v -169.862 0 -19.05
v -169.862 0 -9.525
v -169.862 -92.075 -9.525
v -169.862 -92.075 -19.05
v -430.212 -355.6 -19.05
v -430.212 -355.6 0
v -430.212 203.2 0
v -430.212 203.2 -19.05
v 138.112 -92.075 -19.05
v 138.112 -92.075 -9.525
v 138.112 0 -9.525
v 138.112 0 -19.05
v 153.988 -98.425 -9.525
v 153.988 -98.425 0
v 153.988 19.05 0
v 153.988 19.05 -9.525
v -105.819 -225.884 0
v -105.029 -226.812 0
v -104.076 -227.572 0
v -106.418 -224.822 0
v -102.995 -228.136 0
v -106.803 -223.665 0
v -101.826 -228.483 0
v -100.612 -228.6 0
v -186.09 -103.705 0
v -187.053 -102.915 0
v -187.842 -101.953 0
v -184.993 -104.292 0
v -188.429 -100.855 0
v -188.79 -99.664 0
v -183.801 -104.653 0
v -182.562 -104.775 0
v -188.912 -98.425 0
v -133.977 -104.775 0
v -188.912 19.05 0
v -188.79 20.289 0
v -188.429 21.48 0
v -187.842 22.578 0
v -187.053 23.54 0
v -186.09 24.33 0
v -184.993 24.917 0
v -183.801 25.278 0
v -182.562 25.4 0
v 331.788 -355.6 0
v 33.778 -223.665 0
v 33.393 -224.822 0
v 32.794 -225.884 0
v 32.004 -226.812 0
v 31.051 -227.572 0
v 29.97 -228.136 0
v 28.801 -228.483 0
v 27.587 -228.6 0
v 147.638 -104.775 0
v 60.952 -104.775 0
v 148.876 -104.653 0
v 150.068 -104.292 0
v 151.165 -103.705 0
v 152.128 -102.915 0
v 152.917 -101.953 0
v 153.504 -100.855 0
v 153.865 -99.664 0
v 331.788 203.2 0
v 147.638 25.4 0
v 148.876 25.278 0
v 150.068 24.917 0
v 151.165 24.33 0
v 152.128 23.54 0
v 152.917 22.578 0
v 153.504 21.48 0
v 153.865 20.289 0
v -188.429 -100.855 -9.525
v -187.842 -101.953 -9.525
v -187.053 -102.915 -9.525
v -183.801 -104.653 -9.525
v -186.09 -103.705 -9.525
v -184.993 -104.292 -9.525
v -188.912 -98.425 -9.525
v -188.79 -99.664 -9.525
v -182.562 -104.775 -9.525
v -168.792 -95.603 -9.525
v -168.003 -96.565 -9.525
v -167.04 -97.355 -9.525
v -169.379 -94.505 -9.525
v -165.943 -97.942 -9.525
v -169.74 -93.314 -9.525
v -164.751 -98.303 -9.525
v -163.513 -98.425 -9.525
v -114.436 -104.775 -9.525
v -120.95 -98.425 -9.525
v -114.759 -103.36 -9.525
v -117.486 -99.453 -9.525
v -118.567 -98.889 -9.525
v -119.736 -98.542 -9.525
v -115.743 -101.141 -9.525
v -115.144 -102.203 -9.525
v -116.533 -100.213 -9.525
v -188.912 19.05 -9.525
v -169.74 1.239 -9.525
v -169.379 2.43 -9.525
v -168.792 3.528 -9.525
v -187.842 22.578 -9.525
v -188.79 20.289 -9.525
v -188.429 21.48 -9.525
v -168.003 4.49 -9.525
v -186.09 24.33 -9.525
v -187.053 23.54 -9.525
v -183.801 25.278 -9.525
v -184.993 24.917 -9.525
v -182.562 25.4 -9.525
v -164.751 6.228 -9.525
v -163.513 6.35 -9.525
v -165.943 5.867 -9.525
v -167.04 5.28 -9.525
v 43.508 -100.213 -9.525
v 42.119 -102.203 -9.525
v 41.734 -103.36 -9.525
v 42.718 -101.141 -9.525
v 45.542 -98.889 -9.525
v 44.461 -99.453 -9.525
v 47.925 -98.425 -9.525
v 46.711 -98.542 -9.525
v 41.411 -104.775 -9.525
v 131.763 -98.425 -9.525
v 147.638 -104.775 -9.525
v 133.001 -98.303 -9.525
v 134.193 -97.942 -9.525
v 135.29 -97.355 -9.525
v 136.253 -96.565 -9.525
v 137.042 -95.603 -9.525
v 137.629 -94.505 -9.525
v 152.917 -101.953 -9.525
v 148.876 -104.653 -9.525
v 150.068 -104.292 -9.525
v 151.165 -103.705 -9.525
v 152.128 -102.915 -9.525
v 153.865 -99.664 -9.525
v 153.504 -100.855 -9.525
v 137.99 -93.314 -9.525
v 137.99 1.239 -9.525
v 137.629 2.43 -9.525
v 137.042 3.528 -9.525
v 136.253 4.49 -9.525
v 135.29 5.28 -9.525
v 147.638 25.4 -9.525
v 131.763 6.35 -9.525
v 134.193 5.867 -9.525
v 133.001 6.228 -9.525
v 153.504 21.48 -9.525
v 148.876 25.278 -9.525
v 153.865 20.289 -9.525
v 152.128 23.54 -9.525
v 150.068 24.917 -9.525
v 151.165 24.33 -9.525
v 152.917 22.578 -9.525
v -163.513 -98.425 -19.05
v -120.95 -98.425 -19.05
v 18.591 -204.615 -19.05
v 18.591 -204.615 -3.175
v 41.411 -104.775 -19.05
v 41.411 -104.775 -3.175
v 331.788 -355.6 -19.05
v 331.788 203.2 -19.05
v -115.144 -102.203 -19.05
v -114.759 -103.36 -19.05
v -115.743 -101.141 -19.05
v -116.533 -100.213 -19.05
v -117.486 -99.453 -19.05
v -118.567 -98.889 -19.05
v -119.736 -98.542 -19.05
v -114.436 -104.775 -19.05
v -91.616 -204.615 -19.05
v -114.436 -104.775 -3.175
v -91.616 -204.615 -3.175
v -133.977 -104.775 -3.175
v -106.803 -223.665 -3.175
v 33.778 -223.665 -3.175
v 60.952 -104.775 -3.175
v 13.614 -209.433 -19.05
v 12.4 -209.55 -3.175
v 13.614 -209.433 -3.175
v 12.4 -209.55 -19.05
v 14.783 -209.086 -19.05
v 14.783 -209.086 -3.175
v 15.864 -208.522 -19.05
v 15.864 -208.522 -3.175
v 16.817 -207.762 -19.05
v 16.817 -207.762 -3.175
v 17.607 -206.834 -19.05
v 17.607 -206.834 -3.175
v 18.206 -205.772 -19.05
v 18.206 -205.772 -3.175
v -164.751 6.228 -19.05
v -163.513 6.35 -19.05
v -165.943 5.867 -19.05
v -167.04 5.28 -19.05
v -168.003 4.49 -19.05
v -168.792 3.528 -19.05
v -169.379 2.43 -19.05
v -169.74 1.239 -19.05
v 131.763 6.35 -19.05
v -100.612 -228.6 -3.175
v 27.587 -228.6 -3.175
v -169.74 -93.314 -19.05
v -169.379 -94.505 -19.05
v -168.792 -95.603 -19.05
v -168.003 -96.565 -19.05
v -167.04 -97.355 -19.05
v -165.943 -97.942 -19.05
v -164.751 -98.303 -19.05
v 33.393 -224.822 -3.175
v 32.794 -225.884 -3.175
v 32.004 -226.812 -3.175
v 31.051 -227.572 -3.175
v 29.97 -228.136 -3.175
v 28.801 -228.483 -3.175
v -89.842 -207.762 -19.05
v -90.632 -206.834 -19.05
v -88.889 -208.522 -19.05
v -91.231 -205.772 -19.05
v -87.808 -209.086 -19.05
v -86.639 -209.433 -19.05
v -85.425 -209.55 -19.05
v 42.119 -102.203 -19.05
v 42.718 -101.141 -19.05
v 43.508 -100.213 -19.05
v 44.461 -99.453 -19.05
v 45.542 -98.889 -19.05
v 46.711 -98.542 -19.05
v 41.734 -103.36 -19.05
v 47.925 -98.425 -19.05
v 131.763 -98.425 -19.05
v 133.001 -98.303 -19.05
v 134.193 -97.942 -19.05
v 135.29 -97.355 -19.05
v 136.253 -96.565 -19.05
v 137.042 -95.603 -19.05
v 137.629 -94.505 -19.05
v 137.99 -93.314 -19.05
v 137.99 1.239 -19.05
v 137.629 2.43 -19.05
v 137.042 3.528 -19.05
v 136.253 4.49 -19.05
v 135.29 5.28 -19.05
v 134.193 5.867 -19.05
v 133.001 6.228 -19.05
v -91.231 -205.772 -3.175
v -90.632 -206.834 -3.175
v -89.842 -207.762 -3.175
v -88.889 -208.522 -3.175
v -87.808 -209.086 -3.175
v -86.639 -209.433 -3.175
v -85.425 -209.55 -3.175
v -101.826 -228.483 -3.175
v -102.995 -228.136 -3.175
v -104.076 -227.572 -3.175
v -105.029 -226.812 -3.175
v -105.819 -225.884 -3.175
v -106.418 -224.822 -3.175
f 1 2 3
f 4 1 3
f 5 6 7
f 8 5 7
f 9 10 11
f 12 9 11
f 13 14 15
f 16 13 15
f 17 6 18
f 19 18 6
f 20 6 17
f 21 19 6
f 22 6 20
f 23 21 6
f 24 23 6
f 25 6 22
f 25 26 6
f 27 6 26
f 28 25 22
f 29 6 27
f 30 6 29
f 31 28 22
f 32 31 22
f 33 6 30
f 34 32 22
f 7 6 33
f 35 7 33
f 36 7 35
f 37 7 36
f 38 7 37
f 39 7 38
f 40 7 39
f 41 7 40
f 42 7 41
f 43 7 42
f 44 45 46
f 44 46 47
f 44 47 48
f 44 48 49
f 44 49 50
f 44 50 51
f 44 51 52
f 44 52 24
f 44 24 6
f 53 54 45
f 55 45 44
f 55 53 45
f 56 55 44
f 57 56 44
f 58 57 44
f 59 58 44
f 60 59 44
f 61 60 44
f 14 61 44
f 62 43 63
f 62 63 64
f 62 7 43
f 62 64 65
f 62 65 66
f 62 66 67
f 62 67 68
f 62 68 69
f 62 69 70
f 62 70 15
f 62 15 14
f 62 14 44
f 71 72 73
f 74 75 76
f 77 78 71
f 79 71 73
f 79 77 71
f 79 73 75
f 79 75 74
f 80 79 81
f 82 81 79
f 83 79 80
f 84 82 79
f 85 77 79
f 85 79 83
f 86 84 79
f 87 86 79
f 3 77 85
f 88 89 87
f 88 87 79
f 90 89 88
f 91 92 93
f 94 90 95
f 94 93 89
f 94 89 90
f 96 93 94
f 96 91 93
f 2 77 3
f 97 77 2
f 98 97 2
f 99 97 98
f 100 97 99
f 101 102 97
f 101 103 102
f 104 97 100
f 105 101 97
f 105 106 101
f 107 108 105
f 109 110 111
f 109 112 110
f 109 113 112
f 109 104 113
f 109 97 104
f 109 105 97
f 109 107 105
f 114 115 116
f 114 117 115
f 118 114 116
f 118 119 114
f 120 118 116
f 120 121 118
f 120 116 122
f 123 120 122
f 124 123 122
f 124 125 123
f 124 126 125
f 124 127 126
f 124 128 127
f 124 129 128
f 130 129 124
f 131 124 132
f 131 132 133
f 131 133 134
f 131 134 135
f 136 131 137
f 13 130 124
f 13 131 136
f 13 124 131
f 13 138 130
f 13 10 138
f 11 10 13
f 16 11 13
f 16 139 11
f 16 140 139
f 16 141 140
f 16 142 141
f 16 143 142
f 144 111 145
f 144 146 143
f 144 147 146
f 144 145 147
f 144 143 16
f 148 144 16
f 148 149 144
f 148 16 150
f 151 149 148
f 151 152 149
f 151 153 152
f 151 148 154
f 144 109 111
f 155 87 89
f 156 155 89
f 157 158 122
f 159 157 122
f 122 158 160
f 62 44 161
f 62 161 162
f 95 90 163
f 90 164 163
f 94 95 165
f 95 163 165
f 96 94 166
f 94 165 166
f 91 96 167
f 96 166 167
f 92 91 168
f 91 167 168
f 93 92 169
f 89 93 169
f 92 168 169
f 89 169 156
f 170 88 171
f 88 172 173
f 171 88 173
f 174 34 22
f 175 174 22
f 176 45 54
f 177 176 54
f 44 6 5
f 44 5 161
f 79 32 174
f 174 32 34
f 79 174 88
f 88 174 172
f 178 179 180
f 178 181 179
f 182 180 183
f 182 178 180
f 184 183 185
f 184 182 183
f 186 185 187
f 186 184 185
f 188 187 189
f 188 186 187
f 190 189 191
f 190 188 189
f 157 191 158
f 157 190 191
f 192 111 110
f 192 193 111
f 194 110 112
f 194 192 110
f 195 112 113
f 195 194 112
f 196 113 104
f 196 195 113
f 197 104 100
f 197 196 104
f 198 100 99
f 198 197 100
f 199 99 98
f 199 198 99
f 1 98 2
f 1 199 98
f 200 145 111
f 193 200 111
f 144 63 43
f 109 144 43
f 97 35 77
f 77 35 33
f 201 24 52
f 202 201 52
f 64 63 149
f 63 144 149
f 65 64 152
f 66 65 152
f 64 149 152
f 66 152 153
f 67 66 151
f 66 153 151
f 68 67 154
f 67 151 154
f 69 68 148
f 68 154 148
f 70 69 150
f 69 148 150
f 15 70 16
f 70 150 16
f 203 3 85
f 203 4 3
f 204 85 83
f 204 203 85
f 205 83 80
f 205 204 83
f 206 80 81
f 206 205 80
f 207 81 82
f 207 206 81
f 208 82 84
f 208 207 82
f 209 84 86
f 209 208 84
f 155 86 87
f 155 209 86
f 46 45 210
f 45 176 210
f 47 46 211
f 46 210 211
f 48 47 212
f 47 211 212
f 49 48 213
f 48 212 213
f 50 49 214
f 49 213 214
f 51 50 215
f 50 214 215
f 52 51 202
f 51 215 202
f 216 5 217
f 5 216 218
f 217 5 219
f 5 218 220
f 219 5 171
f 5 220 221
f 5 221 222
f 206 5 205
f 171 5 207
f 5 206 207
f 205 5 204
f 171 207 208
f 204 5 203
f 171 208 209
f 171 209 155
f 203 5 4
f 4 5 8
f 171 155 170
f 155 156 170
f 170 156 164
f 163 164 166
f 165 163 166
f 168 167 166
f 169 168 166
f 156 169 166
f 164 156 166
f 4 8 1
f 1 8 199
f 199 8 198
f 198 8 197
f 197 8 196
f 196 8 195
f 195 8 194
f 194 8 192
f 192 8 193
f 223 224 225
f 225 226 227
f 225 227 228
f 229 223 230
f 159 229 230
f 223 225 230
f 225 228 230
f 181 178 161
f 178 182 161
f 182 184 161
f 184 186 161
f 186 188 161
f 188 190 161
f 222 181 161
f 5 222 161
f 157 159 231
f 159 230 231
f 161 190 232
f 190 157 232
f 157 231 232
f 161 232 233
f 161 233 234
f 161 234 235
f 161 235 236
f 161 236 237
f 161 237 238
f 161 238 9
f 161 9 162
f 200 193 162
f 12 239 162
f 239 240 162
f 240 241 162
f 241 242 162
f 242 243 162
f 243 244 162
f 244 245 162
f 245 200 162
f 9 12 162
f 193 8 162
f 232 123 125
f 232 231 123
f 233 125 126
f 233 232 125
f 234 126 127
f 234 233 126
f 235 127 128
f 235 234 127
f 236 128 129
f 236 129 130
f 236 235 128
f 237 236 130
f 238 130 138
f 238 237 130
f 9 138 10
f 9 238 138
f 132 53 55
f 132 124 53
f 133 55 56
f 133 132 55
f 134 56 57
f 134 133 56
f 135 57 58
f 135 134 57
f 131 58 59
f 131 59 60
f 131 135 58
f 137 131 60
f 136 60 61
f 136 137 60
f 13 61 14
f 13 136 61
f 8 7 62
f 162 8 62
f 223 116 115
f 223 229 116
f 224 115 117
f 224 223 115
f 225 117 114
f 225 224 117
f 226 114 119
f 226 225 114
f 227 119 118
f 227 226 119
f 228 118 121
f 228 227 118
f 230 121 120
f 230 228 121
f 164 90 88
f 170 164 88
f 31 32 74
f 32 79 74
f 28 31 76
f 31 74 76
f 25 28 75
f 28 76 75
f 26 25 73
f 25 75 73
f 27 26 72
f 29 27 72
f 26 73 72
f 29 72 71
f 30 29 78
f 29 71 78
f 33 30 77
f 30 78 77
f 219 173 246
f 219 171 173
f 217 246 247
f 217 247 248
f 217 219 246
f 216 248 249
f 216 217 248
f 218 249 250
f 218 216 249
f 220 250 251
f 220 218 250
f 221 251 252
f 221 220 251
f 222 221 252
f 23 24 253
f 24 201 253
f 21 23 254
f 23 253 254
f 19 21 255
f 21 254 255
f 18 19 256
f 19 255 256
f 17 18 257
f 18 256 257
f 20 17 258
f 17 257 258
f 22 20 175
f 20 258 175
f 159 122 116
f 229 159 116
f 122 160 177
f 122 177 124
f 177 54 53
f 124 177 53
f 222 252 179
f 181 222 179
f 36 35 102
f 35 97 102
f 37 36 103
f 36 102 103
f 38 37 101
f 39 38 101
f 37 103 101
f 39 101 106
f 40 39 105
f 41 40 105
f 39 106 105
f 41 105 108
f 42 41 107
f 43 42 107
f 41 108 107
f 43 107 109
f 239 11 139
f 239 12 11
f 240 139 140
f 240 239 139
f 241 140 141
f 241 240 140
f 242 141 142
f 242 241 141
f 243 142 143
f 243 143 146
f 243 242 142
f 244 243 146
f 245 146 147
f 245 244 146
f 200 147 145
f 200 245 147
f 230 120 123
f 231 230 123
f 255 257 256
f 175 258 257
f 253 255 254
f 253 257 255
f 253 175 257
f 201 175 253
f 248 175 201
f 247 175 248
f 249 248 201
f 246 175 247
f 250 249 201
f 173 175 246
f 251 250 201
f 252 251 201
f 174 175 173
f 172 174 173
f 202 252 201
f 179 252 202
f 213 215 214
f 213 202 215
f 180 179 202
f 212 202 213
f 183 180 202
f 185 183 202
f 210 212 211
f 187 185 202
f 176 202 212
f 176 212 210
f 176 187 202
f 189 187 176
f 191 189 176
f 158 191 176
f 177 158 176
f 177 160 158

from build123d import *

# Parameters (mm, degrees)
F0_W     = 762
F0_H     = 558.8
F2_DEPTH = 19.05
F3_DEPTH = 25.4
F4_DEPTH = 9.525
F5_DEPTH = 9.525
F6_DEPTH = 9.525
F7_DEPTH = 3.175
F8_R     = 6.35
F9_R     = 6.35


with BuildPart() as f2:
    # F0 (on Top) → F2 (new body)
    with BuildSketch(Plane.XY):
        with Locations((-49.2125, -76.2)):
            Rectangle(F0_W, F0_H)
    extrude(amount=-F2_DEPTH)

    # F1 (on face) → F3 (cut)
    with BuildSketch(Plane.XY):
        Polygon((-115.8875, -98.425), (-114.436071, -104.775), (-90.4875, -209.55), (17.4625, -209.55), (41.411071, -104.775), (42.8625, -98.425), (62.403797, -98.425), (138.1125, -98.425), (138.1125, 6.35), (-169.8625, 6.35), (-169.8625, -98.425), (-135.428797, -98.425), align=None)
    extrude(amount=-F3_DEPTH, mode=Mode.SUBTRACT)

    # F1 (on face) → F4 (cut)
    with BuildSketch(Plane.XY):
        Polygon((-188.9125, 25.4), (-188.9125, -104.775), (-133.977369, -104.775), (-135.428797, -98.425), (-169.8625, -98.425), (-169.8625, 6.35), (138.1125, 6.35), (138.1125, -98.425), (62.403797, -98.425), (60.952369, -104.775), (153.9875, -104.775), (153.9875, 25.4), align=None)
    extrude(amount=-F4_DEPTH, mode=Mode.SUBTRACT)

    # F1 (on face) → F5 (cut)
    with BuildSketch(Plane.XY):
        Polygon((41.411071, -104.775), (60.952369, -104.775), (62.403797, -98.425), (42.8625, -98.425), align=None)
    extrude(amount=-F5_DEPTH, mode=Mode.SUBTRACT)

    # F1 (on face) → F6 (cut)
    with BuildSketch(Plane.XY):
        Polygon((-135.428797, -98.425), (-133.977369, -104.775), (-114.436071, -104.775), (-115.8875, -98.425), align=None)
    extrude(amount=-F6_DEPTH, mode=Mode.SUBTRACT)

    # F1 (on face) → F7 (cut)
    with BuildSketch(Plane.XY):
        Polygon((-114.436071, -104.775), (-133.977369, -104.775), (-105.674512, -228.6), (32.649512, -228.6), (60.952369, -104.775), (41.411071, -104.775), (17.4625, -209.55), (-90.4875, -209.55), align=None)
    extrude(amount=-F7_DEPTH, mode=Mode.SUBTRACT)

    # F8
    f8_edges = [f2.edges().sort_by_distance(p)[0] for p in [
        (-169.8625, 6.35, -14.2875),
        (-169.8625, -98.425, -14.2875),
        (-115.8875, -98.425, -14.2875),
        (-90.4875, -209.55, -11.1125),
        (17.4625, -209.55, -11.1125),
        (42.8625, -98.425, -14.2875),
        (138.1125, -98.425, -14.2875),
        (138.1125, 6.35, -14.2875),
    ]]
    fillet(f8_edges, radius=F8_R)

    # F9
    f9_edges = [f2.edges().sort_by_distance(p)[0] for p in [
        (-188.9125, 25.4, -4.7625),
        (153.9875, 25.4, -4.7625),
        (153.9875, -104.775, -4.7625),
        (32.649512, -228.6, -1.5875),
        (-105.674512, -228.6, -1.5875),
        (-188.9125, -104.775, -4.7625),
    ]]
    fillet(f9_edges, radius=F9_R)


solid = f2.part
